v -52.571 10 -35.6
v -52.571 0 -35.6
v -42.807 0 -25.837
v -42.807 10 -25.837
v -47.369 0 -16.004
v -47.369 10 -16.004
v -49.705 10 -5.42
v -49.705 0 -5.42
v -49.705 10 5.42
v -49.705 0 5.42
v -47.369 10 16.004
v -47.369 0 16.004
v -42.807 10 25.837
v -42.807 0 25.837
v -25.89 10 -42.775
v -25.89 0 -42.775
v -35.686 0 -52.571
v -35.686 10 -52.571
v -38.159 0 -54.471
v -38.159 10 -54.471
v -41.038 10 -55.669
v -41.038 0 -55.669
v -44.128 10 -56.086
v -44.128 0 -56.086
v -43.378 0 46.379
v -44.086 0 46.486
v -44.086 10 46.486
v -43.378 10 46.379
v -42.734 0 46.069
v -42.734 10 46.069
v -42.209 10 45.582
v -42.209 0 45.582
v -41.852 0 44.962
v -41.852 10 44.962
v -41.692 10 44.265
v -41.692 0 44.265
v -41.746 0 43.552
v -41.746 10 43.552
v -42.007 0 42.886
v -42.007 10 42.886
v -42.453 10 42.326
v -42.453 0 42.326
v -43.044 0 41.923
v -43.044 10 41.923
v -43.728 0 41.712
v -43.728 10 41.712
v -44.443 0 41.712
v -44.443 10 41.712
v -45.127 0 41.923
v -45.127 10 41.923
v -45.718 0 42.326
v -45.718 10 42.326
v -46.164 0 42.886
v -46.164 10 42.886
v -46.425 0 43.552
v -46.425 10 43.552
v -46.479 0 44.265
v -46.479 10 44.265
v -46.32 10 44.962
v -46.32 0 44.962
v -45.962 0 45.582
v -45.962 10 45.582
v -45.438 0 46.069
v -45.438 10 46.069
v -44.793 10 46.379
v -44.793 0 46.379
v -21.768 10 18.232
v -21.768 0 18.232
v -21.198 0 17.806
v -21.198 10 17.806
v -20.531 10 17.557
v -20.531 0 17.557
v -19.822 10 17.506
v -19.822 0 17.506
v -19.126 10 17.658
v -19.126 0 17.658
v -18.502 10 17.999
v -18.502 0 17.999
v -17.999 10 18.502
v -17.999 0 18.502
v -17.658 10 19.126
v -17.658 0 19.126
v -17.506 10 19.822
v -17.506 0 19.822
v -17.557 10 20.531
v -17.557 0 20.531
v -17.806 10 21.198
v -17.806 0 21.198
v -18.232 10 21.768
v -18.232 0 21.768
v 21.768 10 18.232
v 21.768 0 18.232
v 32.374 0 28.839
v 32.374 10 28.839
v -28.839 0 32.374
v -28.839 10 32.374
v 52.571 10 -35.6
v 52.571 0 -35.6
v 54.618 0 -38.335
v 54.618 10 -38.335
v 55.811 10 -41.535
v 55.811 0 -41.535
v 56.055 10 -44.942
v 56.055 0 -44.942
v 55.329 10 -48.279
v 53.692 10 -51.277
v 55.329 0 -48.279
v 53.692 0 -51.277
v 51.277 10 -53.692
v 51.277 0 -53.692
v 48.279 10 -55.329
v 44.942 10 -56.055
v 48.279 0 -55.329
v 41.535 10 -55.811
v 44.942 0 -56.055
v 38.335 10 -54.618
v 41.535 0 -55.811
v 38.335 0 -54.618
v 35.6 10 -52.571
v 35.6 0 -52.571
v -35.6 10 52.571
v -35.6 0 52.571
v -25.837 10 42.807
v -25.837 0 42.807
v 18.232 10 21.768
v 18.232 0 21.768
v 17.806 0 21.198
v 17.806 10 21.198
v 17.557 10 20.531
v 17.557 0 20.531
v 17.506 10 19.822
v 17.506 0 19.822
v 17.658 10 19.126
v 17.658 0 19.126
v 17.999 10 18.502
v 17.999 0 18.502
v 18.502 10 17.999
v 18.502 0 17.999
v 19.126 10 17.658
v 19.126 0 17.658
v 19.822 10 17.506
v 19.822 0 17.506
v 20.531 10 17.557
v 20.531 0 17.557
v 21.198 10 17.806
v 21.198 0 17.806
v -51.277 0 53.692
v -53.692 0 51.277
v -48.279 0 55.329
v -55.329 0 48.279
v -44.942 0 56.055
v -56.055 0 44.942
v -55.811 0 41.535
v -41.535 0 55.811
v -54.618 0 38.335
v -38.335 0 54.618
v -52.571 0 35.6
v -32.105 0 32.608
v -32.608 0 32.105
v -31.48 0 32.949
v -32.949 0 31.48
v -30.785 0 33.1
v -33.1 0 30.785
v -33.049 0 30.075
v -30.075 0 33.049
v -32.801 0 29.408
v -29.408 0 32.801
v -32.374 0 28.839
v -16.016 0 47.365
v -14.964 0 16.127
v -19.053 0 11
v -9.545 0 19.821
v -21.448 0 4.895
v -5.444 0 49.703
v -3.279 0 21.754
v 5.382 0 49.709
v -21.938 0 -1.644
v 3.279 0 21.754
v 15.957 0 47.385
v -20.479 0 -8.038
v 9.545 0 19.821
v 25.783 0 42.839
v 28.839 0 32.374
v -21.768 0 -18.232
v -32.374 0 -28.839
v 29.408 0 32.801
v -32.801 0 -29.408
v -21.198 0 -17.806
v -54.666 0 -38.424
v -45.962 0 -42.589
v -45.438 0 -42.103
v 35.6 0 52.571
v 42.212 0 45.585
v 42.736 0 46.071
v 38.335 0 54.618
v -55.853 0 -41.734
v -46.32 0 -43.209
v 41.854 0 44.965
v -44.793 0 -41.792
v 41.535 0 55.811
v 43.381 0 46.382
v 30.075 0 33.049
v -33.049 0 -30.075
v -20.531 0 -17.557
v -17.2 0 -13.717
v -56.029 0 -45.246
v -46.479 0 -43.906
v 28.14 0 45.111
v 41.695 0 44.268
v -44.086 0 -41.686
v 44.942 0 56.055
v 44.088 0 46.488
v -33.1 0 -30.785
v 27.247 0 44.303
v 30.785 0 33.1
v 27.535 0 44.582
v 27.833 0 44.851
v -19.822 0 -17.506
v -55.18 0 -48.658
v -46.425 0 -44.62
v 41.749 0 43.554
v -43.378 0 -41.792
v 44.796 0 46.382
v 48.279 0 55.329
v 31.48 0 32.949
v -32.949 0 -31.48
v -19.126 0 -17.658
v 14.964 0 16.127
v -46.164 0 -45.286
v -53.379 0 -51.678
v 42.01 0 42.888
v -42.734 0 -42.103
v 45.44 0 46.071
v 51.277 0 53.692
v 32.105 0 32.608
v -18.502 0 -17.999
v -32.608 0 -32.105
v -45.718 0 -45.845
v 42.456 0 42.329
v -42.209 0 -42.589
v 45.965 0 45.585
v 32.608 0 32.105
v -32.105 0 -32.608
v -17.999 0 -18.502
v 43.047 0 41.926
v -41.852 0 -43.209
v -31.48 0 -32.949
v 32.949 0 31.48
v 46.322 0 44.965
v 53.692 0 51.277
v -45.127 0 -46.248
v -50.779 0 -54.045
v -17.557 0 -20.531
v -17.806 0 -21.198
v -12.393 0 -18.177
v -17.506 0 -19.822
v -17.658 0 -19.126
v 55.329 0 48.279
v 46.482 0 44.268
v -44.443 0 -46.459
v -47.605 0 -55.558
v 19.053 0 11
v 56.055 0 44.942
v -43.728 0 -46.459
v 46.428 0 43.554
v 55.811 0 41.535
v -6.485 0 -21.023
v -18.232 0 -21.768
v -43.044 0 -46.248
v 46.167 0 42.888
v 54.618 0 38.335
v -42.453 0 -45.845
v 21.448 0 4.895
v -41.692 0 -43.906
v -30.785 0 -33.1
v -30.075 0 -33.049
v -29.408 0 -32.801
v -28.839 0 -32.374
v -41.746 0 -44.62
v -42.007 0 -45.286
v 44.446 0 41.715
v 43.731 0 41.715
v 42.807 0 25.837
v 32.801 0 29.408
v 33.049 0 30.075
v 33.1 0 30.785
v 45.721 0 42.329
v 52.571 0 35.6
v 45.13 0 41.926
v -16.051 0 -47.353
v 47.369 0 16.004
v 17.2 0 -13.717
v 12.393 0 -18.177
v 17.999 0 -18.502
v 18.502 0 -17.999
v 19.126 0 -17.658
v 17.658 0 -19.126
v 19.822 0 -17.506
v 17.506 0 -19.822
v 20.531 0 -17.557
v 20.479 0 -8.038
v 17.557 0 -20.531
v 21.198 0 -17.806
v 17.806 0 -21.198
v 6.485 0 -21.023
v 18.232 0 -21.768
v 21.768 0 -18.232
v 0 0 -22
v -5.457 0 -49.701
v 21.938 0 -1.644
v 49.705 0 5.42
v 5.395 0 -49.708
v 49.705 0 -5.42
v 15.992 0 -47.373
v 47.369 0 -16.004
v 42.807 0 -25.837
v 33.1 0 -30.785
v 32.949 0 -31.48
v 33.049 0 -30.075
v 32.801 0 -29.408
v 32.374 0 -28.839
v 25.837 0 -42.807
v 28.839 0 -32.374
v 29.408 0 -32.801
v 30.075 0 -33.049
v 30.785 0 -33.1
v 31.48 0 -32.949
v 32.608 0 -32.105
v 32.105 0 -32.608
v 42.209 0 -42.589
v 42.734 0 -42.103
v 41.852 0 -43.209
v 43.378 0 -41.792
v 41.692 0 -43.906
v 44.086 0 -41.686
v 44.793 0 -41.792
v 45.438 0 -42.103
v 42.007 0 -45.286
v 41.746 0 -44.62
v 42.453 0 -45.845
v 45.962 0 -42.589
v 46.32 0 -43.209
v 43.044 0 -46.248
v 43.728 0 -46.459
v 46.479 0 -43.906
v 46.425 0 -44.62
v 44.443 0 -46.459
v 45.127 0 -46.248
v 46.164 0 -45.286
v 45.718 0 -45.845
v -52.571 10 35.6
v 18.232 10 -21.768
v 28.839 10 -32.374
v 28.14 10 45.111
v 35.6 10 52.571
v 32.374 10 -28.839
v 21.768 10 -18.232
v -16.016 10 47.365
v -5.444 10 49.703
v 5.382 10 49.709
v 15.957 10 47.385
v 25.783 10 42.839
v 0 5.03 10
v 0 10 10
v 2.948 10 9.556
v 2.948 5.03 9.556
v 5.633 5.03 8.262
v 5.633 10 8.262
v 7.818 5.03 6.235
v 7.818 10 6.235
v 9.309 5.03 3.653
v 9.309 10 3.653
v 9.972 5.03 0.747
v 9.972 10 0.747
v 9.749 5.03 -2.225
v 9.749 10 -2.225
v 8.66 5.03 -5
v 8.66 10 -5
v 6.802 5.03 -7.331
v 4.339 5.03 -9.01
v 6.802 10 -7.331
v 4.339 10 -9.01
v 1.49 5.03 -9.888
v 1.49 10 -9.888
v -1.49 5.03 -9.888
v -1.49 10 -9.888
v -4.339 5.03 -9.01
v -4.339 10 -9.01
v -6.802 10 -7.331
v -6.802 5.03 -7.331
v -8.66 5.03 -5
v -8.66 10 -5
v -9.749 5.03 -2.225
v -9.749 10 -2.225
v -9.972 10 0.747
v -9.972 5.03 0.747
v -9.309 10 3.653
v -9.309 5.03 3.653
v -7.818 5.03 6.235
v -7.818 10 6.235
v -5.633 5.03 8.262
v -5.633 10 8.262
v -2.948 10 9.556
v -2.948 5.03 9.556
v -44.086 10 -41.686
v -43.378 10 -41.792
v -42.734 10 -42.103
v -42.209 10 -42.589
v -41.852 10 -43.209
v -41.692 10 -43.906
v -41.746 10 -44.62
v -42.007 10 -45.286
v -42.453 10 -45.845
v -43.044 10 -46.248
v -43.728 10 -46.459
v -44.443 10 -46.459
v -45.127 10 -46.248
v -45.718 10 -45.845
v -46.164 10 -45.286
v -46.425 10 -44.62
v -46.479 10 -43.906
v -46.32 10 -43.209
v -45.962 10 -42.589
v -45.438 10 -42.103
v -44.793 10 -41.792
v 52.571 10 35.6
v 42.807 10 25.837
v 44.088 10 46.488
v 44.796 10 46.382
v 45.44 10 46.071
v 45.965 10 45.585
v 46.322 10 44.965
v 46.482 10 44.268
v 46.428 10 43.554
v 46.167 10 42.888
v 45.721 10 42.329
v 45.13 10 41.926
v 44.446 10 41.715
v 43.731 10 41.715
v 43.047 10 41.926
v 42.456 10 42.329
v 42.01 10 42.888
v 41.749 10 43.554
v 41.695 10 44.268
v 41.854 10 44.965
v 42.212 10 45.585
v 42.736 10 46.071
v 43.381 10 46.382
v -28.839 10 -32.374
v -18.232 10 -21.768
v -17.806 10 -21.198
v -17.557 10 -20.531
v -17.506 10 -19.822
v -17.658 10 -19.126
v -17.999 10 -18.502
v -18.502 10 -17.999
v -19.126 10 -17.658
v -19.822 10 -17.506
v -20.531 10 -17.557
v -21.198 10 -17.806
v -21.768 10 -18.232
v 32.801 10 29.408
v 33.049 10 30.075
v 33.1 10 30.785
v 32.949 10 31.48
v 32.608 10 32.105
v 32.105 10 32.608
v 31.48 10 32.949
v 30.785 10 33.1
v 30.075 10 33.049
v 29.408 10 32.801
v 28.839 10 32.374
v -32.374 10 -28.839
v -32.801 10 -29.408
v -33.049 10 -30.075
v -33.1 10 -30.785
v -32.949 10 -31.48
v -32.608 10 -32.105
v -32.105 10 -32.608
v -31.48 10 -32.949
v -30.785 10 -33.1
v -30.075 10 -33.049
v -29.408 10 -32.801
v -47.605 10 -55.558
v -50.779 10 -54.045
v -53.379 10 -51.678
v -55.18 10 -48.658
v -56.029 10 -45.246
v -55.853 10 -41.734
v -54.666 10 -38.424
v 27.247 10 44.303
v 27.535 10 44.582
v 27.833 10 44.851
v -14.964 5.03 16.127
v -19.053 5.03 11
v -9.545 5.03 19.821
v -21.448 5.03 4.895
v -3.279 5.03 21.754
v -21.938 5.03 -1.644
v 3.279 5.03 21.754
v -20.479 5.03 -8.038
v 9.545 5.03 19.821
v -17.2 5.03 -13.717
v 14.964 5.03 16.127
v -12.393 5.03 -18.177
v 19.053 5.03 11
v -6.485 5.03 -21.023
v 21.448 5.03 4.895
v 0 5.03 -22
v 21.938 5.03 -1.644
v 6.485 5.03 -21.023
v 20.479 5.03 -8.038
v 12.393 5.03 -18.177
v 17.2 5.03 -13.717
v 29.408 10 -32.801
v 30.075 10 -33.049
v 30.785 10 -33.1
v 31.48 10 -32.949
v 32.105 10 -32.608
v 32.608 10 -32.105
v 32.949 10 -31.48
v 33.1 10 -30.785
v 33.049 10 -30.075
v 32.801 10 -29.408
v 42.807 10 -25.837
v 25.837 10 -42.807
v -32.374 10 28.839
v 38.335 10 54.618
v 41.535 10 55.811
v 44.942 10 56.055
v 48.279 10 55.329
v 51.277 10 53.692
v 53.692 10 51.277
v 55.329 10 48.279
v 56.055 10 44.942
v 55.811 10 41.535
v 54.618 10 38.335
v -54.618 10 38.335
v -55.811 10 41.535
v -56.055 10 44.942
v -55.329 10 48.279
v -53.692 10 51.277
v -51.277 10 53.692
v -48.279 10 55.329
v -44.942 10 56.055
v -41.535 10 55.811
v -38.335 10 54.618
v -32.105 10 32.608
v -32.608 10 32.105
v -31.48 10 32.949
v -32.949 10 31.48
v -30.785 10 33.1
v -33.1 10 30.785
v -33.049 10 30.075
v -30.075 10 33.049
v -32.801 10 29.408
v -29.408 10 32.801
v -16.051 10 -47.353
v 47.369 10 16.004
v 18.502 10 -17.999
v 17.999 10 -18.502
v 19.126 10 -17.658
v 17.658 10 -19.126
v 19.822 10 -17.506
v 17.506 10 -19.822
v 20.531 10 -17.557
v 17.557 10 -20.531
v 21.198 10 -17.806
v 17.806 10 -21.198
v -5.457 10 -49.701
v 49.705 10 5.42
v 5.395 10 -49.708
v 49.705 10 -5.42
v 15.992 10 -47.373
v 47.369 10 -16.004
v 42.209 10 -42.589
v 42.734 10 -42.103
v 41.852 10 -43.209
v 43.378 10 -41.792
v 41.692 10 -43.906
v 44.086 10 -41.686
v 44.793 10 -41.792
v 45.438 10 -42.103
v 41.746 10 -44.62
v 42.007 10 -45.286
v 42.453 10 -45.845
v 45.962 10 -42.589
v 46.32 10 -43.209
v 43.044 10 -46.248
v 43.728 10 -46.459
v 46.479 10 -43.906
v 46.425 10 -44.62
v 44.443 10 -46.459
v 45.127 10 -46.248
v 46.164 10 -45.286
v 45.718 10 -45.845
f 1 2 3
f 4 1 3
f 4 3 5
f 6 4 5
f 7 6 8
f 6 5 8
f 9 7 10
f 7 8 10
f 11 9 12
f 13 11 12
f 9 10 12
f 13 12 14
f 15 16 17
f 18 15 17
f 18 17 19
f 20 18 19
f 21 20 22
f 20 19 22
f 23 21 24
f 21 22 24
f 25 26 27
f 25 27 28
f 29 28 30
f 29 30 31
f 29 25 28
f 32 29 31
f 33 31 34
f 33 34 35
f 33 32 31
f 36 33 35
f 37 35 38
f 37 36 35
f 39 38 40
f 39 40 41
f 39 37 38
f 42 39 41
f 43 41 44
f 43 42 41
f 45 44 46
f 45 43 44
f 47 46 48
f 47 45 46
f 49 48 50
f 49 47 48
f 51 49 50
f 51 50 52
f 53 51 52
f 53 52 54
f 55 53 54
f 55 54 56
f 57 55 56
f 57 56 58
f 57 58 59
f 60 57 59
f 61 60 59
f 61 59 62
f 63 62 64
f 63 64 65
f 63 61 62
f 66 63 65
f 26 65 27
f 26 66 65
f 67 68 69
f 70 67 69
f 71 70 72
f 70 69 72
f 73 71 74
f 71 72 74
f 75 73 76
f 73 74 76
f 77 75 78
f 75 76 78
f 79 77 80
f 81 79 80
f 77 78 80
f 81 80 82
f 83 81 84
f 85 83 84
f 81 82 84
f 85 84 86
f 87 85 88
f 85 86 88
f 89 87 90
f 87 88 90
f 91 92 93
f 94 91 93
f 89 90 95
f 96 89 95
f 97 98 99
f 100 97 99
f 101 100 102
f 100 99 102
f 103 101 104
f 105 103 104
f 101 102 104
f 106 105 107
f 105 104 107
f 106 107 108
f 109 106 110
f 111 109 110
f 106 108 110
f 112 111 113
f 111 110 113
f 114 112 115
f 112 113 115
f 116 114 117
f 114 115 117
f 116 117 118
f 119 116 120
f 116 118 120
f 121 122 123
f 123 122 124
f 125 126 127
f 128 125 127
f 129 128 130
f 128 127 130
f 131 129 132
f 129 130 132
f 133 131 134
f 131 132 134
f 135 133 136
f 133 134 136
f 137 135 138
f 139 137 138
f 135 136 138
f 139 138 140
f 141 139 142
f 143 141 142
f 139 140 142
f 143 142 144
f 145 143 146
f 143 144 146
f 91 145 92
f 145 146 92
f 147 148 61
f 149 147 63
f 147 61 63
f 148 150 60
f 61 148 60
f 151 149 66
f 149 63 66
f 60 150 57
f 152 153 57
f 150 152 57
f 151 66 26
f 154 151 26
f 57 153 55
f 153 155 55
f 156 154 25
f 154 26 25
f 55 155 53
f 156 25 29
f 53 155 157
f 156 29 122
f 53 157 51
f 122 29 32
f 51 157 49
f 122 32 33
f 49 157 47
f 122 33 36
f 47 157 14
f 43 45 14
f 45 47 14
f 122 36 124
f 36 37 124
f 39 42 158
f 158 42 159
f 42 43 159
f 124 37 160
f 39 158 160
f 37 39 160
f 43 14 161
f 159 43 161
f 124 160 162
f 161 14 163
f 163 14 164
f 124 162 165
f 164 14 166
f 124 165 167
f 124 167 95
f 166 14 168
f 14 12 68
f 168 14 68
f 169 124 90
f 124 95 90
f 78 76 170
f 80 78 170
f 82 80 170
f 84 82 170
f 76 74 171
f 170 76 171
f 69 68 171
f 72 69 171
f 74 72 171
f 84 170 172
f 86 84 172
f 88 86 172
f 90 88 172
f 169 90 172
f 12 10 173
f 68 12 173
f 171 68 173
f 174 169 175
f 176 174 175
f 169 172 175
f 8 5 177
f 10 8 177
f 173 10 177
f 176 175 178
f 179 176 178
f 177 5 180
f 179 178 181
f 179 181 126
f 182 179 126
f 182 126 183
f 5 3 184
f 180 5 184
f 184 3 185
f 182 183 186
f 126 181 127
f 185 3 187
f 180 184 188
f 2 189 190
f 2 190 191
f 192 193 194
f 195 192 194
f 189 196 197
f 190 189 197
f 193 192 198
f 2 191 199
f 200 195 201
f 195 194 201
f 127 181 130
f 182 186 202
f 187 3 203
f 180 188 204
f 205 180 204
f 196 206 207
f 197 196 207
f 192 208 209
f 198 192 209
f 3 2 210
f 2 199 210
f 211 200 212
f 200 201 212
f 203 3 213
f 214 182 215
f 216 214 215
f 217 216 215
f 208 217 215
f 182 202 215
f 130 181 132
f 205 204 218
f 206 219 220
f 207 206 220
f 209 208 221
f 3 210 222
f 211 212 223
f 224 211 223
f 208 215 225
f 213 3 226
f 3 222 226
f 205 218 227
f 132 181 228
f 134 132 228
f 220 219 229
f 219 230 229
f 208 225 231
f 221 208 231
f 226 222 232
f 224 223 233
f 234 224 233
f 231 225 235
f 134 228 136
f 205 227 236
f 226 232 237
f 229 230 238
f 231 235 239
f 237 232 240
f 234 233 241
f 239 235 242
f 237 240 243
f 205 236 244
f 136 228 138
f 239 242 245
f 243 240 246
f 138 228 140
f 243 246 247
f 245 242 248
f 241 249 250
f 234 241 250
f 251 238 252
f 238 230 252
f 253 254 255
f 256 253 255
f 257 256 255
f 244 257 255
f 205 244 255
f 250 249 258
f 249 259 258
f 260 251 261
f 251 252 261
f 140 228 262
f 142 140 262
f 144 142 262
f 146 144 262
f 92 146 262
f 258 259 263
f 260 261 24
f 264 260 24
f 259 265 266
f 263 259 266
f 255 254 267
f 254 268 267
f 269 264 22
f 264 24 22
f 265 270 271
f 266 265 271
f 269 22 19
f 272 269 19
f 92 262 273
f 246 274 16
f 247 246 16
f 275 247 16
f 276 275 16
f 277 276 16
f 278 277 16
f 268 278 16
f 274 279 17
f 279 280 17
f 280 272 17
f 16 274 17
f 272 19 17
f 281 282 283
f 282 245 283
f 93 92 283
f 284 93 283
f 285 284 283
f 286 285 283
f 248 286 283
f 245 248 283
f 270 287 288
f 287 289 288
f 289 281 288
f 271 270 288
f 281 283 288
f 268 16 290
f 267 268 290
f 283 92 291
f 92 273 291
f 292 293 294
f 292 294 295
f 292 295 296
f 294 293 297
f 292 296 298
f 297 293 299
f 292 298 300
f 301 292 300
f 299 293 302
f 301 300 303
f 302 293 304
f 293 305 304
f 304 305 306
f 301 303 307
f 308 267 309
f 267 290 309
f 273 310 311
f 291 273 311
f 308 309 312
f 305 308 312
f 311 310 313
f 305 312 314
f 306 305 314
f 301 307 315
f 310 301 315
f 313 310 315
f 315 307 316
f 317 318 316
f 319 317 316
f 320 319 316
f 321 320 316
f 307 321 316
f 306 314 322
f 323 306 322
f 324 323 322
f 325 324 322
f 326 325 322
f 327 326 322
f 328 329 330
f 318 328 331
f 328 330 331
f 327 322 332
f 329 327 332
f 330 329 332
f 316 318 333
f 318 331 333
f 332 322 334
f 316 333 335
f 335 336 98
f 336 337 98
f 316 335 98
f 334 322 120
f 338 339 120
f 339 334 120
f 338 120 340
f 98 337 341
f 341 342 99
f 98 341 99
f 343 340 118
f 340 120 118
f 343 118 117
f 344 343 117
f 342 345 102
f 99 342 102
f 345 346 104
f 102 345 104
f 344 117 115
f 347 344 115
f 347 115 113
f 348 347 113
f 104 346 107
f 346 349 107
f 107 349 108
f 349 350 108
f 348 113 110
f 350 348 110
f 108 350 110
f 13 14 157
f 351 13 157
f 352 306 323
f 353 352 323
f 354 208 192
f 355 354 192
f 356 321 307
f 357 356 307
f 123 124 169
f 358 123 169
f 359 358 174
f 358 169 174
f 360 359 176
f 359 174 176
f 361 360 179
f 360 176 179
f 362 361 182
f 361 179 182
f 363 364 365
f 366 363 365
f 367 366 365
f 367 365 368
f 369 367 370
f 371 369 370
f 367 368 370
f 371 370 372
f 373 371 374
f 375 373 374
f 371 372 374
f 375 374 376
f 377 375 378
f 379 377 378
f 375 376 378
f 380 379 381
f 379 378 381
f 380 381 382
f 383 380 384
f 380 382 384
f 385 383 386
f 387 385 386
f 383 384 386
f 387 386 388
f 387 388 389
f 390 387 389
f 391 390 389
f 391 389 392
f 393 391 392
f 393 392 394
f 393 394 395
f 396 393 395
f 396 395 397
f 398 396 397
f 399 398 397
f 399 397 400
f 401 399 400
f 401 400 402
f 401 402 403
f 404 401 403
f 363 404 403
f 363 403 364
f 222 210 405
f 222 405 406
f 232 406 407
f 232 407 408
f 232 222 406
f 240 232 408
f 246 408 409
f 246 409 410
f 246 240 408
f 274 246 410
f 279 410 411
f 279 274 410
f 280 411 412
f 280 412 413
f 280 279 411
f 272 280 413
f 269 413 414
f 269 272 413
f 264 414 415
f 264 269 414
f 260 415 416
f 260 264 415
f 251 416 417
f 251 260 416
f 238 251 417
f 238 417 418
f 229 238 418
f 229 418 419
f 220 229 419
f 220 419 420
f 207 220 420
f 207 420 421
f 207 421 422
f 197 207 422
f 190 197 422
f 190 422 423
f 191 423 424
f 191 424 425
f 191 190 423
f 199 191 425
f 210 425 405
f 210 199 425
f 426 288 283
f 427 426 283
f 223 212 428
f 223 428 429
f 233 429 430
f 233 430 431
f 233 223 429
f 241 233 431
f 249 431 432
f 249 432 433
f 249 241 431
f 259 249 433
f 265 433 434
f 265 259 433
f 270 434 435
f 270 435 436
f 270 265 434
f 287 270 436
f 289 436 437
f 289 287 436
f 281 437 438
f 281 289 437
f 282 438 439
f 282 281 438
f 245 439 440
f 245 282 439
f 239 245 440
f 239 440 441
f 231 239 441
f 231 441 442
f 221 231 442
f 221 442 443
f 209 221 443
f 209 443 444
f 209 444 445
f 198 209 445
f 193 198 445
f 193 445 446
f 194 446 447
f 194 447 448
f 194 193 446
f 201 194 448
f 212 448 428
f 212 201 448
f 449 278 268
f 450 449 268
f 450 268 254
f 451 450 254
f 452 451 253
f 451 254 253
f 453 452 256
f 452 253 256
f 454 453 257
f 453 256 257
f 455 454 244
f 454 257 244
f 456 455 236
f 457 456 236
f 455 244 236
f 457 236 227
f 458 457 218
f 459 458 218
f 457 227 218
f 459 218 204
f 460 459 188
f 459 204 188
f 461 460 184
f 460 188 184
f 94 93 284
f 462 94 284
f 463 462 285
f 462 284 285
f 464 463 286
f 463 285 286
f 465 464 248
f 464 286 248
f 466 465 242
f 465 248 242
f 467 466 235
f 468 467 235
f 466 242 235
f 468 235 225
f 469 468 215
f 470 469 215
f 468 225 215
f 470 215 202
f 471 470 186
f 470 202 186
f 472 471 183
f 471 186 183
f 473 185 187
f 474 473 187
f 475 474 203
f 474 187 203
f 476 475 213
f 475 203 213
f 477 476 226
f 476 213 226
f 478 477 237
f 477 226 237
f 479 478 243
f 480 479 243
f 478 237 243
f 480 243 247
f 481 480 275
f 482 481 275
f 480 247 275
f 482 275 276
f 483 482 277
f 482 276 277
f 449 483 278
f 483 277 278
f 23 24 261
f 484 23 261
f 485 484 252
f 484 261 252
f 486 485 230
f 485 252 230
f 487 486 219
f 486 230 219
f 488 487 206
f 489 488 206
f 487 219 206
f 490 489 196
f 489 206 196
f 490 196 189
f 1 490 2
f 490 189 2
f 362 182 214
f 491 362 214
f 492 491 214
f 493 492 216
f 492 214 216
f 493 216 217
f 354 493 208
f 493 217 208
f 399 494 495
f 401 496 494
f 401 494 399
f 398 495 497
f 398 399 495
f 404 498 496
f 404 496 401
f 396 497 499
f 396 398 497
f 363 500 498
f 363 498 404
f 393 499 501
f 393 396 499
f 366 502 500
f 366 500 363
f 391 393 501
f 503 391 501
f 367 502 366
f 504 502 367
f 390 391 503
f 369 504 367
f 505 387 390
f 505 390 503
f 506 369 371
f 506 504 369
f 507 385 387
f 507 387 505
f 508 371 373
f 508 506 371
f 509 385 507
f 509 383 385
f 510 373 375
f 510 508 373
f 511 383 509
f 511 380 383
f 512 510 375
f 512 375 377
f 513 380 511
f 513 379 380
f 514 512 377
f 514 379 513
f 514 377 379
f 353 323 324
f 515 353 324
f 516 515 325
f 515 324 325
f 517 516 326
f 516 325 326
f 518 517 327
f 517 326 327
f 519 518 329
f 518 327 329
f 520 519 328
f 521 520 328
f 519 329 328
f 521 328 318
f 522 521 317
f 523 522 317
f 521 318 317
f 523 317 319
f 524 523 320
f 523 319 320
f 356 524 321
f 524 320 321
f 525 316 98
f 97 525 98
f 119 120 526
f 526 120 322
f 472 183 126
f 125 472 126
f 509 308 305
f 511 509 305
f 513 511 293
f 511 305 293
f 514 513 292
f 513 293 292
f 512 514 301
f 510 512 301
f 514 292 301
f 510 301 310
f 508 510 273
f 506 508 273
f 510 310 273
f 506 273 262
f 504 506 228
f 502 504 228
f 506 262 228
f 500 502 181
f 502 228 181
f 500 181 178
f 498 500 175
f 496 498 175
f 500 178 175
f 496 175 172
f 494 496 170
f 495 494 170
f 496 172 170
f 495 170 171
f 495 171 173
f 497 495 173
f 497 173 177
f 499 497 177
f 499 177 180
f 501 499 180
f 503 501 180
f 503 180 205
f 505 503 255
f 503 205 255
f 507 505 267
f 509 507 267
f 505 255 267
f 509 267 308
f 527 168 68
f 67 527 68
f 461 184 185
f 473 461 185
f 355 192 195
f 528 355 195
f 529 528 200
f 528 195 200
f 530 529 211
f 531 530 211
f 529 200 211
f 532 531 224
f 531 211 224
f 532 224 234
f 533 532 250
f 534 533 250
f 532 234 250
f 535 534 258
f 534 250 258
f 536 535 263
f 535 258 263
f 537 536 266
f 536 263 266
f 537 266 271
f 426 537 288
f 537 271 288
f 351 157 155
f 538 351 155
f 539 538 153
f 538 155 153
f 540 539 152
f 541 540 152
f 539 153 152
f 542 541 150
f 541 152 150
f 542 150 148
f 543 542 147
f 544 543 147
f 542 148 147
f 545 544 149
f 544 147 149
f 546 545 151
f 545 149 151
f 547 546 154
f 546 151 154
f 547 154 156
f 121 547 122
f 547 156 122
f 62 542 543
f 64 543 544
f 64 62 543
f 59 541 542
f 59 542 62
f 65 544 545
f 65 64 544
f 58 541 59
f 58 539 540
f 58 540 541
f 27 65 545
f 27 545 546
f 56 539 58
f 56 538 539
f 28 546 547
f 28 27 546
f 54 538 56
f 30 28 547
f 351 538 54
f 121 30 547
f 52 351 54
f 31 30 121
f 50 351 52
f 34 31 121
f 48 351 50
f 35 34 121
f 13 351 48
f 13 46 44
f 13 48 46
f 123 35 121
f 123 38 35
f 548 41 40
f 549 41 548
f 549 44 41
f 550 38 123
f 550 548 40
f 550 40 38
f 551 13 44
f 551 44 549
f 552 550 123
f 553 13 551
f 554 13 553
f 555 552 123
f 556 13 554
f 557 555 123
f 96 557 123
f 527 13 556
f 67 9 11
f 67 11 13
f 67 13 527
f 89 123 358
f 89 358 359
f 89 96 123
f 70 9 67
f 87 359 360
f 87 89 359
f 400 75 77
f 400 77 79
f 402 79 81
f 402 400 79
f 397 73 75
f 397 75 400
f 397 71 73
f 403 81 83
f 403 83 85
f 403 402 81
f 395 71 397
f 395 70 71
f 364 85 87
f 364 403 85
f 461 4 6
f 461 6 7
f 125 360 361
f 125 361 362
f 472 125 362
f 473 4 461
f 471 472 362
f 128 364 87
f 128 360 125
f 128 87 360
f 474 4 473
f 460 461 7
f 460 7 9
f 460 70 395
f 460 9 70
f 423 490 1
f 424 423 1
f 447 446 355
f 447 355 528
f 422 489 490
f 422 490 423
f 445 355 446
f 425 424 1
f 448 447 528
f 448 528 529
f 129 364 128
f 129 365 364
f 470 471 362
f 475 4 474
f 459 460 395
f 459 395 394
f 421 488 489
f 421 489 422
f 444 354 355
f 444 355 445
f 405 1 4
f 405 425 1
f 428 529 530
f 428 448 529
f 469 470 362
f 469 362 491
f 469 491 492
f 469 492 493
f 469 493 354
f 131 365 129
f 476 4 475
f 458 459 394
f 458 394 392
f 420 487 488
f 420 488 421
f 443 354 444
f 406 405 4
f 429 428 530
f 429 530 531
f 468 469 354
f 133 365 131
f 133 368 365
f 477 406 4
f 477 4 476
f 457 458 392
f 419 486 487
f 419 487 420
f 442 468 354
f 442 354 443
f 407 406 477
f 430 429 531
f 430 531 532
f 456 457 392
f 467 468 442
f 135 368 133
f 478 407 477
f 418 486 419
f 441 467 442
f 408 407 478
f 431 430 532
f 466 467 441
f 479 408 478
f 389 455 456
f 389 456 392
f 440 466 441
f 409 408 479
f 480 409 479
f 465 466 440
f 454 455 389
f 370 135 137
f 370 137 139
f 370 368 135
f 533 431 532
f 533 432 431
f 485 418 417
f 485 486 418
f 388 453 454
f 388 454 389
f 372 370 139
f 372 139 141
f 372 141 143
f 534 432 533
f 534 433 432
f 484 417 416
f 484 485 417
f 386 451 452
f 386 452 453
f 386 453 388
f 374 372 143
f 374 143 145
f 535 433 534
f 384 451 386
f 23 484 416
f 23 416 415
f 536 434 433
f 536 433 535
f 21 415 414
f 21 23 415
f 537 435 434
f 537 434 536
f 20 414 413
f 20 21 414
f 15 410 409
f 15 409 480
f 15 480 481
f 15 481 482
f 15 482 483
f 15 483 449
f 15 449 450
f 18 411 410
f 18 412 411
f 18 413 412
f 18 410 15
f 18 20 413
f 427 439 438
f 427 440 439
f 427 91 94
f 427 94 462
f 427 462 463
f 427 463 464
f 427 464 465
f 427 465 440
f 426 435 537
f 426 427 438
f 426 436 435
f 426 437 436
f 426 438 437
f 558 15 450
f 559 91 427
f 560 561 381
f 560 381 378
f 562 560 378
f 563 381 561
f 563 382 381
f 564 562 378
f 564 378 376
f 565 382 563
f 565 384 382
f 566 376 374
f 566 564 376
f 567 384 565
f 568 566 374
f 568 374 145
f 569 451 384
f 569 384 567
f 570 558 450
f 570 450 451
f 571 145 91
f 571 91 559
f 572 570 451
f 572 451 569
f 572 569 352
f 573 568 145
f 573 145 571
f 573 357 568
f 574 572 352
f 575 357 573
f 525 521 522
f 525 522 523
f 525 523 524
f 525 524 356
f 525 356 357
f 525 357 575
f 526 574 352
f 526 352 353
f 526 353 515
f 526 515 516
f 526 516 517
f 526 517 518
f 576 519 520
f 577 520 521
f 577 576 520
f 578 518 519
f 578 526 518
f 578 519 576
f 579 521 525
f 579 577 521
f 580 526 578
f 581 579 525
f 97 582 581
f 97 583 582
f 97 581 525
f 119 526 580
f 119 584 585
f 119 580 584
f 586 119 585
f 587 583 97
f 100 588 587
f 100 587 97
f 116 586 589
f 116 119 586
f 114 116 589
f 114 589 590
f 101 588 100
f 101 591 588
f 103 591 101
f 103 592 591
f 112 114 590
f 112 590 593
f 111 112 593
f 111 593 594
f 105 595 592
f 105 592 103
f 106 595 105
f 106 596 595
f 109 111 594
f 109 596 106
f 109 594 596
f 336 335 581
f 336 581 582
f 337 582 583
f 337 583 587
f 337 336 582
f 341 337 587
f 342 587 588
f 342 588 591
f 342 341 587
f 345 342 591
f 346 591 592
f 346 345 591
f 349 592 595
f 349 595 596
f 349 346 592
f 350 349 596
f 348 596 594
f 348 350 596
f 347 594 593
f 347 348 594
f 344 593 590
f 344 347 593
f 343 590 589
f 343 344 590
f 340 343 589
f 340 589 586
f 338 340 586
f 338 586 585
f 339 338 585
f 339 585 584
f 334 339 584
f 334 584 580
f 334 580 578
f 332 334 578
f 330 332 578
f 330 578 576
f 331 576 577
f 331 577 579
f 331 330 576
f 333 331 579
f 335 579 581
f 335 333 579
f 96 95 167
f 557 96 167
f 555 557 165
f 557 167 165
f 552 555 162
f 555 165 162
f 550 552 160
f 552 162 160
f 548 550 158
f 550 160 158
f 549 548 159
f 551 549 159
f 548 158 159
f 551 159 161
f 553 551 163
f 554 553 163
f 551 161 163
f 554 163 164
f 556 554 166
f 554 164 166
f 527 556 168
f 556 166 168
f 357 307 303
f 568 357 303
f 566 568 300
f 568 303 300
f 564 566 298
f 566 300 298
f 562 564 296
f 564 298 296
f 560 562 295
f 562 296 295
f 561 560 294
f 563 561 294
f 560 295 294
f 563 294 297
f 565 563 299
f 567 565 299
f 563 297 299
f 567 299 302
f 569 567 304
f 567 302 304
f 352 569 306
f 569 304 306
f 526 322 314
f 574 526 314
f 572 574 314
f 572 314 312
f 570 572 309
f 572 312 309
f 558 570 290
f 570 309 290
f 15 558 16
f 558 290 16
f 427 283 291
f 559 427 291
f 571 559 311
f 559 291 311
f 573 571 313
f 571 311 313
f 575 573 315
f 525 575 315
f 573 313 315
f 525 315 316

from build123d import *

# Parameters (mm, degrees)
SKETCH2_R           = 2.4
BOSS_EXTRUDE1_DEPTH = 10
SKETCH3_R           = 22
CUT_EXTRUDE1_DEPTH  = 5.03
SKETCH5_R           = 10
CUT_EXTRUDE4_DEPTH  = 5.03


with BuildPart() as part:
    # Sketch2 → Boss-Extrude1 (new body)
    with BuildSketch(Plane(origin=(0, 0, 0), x_dir=(1, 0, 0), z_dir=(0, 1, 0))):
        with BuildLine():
            ThreePointArc((52.570951393, 35.600388644), (52.570951393, 52.570951393), (35.600388644, 52.570951393))
            Line((35.600388644, 52.570951393), (25.836723229, 42.807285978))
            ThreePointArc((25.836723229, 42.807285978), (-0.031141312, 49.999990302), (-25.890026175, 42.775069195))
            Line((-25.890026175, 42.775069195), (-35.685908373, 52.570951393))
            ThreePointArc((-35.685908373, 52.570951393), (-39.559243335, 55.164025054), (-44.128429883, 56.085593835))
            ThreePointArc((-44.128429883, 56.085593835), (-55.180388571, 48.658111405), (-52.570951393, 35.600388644))
            Line((-52.570951393, 35.600388644), (-42.807285978, 25.836723229))
            ThreePointArc((-42.807285978, 25.836723229), (-50, 0), (-42.807285978, -25.836723229))
            Line((-42.807285978, -25.836723229), (-52.570951393, -35.600388644))
            ThreePointArc((-52.570951393, -35.600388644), (-52.570951393, -52.570951393), (-35.600388644, -52.570951393))
            Line((-35.600388644, -52.570951393), (-25.836723229, -42.807285978))
            ThreePointArc((-25.836723229, -42.807285978), (-0.031150905, -49.999990296), (25.783363755, -42.839446232))
            Line((25.783363755, -42.839446232), (27.246595152, -44.30267763))
            ThreePointArc((27.246595152, -44.30267763), (27.683219954, -44.717909015), (28.140137338, -45.110700086))
            Line((28.140137338, -45.110700086), (35.600388644, -52.570951393))
            ThreePointArc((35.600388644, -52.570951393), (52.570951393, -52.570951393), (52.570951393, -35.600388644))
            Line((52.570951393, -35.600388644), (42.807285978, -25.836723229))
            ThreePointArc((42.807285978, -25.836723229), (50, 0), (42.807285978, 25.836723229))
            Line((42.807285978, 25.836723229), (52.570951393, 35.600388644))
        make_face()
        with Locations(Location((-44.085670018, -44.085670018, 0), (0, 0, 270))):
            Circle(SKETCH2_R, mode=Mode.SUBTRACT)
        with BuildLine():
            Line((-18.232233047, -21.767766953), (-28.838834765, -32.374368671))
            ThreePointArc((-28.838834765, -32.374368671), (-32.374368671, -32.374368671), (-32.374368671, -28.838834765))
            Line((-32.374368671, -28.838834765), (-21.767766953, -18.232233047))
            ThreePointArc((-21.767766953, -18.232233047), (-18.232233047, -18.232233047), (-18.232233047, -21.767766953))
        make_face(mode=Mode.SUBTRACT)
        with Locations(Location((44.088384567, -44.088356778, 0), (0, 0, 270))):
            Circle(SKETCH2_R, mode=Mode.SUBTRACT)
        with BuildLine():
            ThreePointArc((32.374368671, -28.838834765), (32.374368671, -32.374368671), (28.838834765, -32.374368671))
            Line((28.838834765, -32.374368671), (18.232233047, -21.767766953))
            ThreePointArc((18.232233047, -21.767766953), (18.232233047, -18.232233047), (21.767766953, -18.232233047))
            Line((21.767766953, -18.232233047), (32.374368671, -28.838834765))
        make_face(mode=Mode.SUBTRACT)
        with BuildLine():
            ThreePointArc((-32.374368671, 28.838834765), (-32.374368671, 32.374368671), (-28.838834765, 32.374368671))
            Line((-28.838834765, 32.374368671), (-18.232233047, 21.767766953))
            ThreePointArc((-18.232233047, 21.767766953), (-18.232233047, 18.232233047), (-21.767766953, 18.232233047))
            Line((-21.767766953, 18.232233047), (-32.374368671, 28.838834765))
        make_face(mode=Mode.SUBTRACT)
        with Locations(Location((-44.085670018, 44.085670018, 0), (0, 0, 270))):
            Circle(SKETCH2_R, mode=Mode.SUBTRACT)
        with BuildLine():
            Line((18.232233047, 21.767766953), (28.838834765, 32.374368671))
            ThreePointArc((28.838834765, 32.374368671), (32.374368671, 32.374368671), (32.374368671, 28.838834765))
            Line((32.374368671, 28.838834765), (21.767766953, 18.232233047))
            ThreePointArc((21.767766953, 18.232233047), (18.232233047, 18.232233047), (18.232233047, 21.767766953))
        make_face(mode=Mode.SUBTRACT)
        with Locations(Location((44.085670018, 44.085670018, 0), (0, 0, 270))):
            Circle(SKETCH2_R, mode=Mode.SUBTRACT)
    extrude(amount=BOSS_EXTRUDE1_DEPTH)

    # Sketch3 → Cut-Extrude1 (cut)
    with BuildSketch(Plane(origin=(0, 0, 0), x_dir=(-1, 0, 0), z_dir=(0, -1, 0))):
        with Locations(Location((0, 0, 0), (0, 0, 90))):
            Circle(SKETCH3_R)
    extrude(amount=-CUT_EXTRUDE1_DEPTH, mode=Mode.SUBTRACT)

    # Sketch5 → Cut-Extrude4 (cut)
    with BuildSketch(Plane(origin=(0, 10, 0), x_dir=(1, 0, 0), z_dir=(0, 1, 0))):
        with Locations(Location((0, 0, 0), (0, 0, 270))):
            Circle(SKETCH5_R)
    extrude(amount=-CUT_EXTRUDE4_DEPTH, mode=Mode.SUBTRACT)


solid = part.part
